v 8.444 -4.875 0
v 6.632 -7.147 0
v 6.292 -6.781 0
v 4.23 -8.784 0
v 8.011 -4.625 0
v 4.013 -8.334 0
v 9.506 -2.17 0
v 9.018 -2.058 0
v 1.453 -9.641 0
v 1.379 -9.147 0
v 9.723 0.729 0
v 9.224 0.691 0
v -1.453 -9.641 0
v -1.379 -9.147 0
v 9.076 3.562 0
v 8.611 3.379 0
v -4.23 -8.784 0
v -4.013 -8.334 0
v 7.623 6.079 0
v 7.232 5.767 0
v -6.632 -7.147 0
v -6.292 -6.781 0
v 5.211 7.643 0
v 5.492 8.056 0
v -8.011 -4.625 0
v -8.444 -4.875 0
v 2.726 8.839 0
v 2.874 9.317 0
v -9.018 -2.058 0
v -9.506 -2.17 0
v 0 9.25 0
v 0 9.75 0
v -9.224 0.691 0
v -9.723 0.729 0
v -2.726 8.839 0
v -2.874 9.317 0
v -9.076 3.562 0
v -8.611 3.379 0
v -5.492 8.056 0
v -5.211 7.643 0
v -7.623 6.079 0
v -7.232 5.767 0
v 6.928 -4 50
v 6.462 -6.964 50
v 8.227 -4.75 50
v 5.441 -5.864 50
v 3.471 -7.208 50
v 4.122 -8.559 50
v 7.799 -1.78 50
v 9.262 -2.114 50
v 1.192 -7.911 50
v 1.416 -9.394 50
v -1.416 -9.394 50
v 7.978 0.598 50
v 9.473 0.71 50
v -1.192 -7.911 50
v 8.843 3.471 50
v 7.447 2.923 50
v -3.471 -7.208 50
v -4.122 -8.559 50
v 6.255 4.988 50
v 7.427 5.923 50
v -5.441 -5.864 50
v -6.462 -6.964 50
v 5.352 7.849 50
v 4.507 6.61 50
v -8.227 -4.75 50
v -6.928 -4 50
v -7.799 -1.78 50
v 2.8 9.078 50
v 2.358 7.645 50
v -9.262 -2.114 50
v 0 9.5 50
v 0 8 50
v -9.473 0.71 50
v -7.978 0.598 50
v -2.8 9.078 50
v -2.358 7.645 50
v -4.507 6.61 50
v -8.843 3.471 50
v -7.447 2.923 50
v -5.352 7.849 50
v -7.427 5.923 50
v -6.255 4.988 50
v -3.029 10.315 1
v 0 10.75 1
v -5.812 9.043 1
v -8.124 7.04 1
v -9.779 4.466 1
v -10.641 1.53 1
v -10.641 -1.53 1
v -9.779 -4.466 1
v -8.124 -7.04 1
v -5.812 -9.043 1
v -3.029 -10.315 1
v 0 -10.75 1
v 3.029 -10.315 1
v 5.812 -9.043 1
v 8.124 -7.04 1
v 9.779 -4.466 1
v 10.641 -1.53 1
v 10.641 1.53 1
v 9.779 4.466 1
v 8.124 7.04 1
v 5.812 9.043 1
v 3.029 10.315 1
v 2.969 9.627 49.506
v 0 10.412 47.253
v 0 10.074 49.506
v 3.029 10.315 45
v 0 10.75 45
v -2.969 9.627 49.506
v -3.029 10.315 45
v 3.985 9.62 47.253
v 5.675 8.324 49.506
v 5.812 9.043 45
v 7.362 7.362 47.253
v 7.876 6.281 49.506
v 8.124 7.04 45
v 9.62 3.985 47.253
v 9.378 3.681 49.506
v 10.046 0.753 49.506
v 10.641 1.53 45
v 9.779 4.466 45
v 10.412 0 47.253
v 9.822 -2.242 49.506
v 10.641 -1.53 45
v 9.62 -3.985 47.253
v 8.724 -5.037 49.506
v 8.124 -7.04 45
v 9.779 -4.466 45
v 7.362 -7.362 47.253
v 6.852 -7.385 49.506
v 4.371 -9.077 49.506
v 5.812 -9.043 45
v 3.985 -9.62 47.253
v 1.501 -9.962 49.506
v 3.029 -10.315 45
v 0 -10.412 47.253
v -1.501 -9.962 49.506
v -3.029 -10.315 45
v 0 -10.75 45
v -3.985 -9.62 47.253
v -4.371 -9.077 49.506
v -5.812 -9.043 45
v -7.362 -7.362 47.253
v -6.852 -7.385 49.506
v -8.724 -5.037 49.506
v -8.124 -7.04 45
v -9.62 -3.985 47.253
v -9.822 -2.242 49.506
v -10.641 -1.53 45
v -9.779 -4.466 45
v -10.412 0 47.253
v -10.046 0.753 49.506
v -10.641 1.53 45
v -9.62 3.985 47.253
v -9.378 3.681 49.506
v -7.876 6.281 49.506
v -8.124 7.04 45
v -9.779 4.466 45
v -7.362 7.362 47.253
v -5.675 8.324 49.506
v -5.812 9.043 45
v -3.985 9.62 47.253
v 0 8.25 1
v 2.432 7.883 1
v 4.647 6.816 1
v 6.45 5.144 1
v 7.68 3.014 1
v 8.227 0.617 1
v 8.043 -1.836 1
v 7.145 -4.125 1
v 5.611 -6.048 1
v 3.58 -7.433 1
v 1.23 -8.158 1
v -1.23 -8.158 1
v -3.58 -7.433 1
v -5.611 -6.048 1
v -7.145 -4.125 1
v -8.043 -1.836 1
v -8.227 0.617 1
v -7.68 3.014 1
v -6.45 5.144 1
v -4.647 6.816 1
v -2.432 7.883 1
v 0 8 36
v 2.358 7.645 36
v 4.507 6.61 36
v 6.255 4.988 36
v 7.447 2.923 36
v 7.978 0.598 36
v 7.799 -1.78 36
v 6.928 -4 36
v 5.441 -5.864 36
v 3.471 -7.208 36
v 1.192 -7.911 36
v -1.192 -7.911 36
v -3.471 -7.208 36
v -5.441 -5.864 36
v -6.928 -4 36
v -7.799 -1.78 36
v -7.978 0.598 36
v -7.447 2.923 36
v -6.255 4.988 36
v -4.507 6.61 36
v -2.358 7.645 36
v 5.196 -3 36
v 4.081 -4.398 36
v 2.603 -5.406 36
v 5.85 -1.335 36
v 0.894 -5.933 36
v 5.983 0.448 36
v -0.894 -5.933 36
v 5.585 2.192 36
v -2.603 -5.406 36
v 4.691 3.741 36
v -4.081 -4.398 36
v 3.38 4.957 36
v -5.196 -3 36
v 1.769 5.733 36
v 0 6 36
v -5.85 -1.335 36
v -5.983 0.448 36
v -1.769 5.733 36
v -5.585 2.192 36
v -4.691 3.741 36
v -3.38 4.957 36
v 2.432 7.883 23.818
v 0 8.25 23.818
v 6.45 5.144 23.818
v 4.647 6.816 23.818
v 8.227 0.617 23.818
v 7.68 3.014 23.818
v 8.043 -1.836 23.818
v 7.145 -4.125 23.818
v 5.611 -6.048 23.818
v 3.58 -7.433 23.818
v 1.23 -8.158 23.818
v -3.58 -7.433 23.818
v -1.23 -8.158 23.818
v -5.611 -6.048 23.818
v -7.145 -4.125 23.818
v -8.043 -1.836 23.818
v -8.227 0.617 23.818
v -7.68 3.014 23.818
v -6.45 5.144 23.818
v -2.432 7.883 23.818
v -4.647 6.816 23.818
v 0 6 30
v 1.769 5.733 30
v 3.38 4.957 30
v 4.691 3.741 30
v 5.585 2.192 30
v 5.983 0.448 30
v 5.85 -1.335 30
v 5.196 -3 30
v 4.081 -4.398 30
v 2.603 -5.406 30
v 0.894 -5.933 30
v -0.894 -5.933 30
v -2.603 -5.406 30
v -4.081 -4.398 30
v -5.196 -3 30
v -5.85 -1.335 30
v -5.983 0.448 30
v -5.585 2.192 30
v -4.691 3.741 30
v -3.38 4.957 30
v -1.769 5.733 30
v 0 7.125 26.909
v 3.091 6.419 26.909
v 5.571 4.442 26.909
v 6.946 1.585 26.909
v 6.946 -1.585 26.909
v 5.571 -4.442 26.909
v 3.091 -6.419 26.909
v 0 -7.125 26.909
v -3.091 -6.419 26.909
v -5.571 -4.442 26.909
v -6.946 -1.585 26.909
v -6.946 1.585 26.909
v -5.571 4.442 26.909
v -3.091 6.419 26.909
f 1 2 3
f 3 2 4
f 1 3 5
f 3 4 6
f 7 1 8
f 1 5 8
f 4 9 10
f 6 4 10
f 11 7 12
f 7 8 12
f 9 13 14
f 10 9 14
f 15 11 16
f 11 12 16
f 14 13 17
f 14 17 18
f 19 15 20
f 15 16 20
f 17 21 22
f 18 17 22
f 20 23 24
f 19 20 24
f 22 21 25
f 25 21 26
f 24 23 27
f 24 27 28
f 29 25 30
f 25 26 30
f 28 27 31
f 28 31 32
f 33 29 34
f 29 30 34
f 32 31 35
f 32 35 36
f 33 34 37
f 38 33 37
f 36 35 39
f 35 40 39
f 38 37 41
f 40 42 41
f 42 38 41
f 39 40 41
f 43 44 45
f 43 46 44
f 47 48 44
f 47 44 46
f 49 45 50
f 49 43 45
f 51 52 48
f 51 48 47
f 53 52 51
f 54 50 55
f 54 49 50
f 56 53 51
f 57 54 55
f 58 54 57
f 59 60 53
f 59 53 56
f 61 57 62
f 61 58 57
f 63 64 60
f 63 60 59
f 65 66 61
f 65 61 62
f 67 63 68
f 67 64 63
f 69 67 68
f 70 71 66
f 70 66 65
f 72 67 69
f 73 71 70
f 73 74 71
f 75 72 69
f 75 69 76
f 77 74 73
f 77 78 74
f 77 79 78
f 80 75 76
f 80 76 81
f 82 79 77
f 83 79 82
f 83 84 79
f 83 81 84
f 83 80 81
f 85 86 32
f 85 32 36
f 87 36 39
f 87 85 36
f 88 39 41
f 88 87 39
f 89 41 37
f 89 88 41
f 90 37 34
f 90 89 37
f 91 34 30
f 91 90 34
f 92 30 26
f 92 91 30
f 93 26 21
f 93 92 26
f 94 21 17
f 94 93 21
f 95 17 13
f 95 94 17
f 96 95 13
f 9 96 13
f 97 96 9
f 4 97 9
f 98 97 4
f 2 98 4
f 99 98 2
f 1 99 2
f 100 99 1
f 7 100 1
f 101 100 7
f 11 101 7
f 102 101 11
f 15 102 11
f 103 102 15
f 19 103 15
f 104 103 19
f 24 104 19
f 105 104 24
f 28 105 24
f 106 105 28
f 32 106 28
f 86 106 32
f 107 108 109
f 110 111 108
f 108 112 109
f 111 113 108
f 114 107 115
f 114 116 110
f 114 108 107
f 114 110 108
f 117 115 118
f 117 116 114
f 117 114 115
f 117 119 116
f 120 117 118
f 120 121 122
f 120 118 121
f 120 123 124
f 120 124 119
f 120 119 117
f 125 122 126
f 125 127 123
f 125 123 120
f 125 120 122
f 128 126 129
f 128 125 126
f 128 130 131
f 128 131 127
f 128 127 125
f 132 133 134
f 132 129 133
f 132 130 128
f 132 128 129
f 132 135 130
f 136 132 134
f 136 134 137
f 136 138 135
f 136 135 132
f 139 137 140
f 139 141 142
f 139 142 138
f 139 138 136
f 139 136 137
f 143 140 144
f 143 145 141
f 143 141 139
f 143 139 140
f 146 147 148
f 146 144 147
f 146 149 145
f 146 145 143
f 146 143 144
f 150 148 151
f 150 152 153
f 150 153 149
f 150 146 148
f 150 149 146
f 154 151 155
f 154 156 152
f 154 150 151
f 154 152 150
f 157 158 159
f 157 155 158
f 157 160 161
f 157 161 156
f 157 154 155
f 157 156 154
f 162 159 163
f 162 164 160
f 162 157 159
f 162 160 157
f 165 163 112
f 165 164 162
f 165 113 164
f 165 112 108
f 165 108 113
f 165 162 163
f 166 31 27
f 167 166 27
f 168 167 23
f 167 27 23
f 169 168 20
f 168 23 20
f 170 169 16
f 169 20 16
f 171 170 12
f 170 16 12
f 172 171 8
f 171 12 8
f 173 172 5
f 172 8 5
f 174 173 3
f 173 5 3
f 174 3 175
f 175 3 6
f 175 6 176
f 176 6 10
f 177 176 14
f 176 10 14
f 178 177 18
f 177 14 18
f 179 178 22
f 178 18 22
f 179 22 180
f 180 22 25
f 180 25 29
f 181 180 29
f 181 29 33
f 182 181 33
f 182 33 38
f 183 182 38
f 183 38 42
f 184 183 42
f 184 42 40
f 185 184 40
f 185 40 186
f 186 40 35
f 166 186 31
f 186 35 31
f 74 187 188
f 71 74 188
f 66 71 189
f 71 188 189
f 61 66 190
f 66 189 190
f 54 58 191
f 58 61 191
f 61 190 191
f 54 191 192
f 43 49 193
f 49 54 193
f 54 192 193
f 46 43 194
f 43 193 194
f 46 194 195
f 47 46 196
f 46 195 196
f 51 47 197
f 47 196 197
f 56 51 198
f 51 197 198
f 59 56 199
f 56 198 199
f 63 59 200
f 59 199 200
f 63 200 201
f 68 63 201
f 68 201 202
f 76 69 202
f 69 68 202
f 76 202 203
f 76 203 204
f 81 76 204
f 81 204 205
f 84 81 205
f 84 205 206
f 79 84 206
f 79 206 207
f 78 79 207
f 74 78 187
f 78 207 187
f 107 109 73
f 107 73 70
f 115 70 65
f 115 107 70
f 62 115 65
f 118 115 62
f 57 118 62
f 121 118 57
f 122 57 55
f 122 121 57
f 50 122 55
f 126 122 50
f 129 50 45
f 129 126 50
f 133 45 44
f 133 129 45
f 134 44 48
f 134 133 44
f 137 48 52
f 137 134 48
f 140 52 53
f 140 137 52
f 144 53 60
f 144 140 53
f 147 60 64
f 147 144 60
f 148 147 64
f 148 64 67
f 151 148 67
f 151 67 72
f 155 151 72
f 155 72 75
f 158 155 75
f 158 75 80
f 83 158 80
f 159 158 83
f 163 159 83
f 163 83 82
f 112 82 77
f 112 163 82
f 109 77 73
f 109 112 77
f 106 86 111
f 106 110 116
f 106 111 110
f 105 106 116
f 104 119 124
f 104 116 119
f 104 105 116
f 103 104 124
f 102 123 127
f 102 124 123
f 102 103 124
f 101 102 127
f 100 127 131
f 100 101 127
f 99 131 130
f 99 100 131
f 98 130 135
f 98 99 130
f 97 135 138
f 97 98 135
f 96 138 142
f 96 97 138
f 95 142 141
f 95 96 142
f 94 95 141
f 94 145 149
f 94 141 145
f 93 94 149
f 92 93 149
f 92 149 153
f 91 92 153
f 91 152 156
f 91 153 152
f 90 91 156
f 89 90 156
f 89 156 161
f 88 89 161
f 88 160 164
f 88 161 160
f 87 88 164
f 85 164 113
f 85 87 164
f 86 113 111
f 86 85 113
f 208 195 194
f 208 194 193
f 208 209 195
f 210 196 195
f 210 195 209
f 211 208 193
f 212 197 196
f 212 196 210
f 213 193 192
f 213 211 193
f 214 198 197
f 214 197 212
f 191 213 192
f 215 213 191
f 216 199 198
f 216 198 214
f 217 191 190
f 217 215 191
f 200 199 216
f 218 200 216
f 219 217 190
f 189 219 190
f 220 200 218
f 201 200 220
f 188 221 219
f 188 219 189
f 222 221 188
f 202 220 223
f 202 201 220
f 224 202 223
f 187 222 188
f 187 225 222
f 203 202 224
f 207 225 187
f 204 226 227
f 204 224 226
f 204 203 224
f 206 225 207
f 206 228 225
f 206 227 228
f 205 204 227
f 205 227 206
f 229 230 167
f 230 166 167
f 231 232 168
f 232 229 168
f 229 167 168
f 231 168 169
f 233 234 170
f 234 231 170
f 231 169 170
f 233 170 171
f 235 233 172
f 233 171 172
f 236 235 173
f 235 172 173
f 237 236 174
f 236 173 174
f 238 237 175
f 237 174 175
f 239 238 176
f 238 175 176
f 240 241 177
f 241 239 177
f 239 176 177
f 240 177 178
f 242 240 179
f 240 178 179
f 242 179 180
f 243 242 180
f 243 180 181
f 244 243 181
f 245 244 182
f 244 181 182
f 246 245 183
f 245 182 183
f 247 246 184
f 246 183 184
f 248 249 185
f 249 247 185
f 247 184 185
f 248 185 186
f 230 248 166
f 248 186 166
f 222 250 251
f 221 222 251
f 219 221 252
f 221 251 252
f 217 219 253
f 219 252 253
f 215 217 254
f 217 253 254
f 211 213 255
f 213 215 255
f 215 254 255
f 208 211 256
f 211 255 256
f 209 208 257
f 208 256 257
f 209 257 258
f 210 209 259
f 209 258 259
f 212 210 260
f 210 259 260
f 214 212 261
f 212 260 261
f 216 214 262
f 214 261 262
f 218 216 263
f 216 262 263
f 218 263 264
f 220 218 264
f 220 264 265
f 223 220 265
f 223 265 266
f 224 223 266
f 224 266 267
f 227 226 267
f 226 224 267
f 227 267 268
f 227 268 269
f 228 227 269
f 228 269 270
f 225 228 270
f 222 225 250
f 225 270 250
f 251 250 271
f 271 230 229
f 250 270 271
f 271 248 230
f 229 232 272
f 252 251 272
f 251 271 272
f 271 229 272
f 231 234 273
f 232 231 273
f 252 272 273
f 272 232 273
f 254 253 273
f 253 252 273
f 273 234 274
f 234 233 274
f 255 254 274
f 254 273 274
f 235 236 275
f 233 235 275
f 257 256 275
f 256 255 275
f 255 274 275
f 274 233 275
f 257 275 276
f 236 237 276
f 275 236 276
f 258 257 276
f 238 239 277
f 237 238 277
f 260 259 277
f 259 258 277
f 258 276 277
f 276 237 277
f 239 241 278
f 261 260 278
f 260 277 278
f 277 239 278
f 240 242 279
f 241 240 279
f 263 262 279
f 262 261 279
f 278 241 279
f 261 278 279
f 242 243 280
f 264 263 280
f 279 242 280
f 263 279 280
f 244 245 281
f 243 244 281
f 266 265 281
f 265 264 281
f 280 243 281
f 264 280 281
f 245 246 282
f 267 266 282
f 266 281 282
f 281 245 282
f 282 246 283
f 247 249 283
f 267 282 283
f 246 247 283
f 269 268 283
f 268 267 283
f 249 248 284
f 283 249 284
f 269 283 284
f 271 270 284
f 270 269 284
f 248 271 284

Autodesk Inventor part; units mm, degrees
ref_plane "XZ Plane" through (0, 0, 0) normal (0, 1, 0) x (-1, 0, 0)
ref_plane "XY Plane" through (0, 0, 0) normal (0, 0, 1) x (1, 0, 0)
sketch "Esquisse1" plane through (0, 0, 0) normal (1, 0, 0) x (0, 1, 0)
  line L0 (0, 0) -> (0, 17.1522)
  line L1 (8, 50) -> (8, 36)
  line L2 (8, 36) -> (6, 36)
  line L3 (6, 36) -> (6, 30)
  line L4 (6, 30) -> (8.25, 23.8182)
  line L5 (8.25, 23.8182) -> (8.25, 1)
  line L6 (8.25, 1) -> (9.25, 0)
  line L7 (9.25, 0) -> (9.75, 0)
  line L8 (8, 50) -> (10, 50)
  line L9 (10, 50) -> (10.75, 45)
  line L10 (10.75, 45) -> (10.75, 1)
  line L11 (10.75, 1) -> (9.75, 0)
  dimension "d0" = 160
  dimension "d1" = 6
  dimension "d2" = 14
  dimension "d4" = 16
  dimension "d6" = 16.5
  dimension "d8" = 1
  dimension "d9" = 1
  dimension "d10" = 30
  dimension "d11" = 2
  dimension "d12" = 2
  dimension "d13" = 21.5
  dimension "d14" = 2.5
  dimension "d15" = 5
  dimension "d19" = 1
  dimension "d20" = 1
  dimension "d48" = 2.75
  dimension "d49" = 4.75
revolve "Révolution1" add sketch "Esquisse1" angle 360 about axis through (0, 0, 0) along (0, 0, 1)
thread "Filetage1" size "M16x2" class "6H" standard "ISO Metric profile" full length
ref_plane "Plan de construction2" through (14, 0, 0) normal (1, 0, 0) x (0, 1, 0)
chamfer "Chanfrein4" distance 0.5 angle 45 1 edges at (0, -10, 50)
properties part number "support_douille" material "Aluminium 6061"
